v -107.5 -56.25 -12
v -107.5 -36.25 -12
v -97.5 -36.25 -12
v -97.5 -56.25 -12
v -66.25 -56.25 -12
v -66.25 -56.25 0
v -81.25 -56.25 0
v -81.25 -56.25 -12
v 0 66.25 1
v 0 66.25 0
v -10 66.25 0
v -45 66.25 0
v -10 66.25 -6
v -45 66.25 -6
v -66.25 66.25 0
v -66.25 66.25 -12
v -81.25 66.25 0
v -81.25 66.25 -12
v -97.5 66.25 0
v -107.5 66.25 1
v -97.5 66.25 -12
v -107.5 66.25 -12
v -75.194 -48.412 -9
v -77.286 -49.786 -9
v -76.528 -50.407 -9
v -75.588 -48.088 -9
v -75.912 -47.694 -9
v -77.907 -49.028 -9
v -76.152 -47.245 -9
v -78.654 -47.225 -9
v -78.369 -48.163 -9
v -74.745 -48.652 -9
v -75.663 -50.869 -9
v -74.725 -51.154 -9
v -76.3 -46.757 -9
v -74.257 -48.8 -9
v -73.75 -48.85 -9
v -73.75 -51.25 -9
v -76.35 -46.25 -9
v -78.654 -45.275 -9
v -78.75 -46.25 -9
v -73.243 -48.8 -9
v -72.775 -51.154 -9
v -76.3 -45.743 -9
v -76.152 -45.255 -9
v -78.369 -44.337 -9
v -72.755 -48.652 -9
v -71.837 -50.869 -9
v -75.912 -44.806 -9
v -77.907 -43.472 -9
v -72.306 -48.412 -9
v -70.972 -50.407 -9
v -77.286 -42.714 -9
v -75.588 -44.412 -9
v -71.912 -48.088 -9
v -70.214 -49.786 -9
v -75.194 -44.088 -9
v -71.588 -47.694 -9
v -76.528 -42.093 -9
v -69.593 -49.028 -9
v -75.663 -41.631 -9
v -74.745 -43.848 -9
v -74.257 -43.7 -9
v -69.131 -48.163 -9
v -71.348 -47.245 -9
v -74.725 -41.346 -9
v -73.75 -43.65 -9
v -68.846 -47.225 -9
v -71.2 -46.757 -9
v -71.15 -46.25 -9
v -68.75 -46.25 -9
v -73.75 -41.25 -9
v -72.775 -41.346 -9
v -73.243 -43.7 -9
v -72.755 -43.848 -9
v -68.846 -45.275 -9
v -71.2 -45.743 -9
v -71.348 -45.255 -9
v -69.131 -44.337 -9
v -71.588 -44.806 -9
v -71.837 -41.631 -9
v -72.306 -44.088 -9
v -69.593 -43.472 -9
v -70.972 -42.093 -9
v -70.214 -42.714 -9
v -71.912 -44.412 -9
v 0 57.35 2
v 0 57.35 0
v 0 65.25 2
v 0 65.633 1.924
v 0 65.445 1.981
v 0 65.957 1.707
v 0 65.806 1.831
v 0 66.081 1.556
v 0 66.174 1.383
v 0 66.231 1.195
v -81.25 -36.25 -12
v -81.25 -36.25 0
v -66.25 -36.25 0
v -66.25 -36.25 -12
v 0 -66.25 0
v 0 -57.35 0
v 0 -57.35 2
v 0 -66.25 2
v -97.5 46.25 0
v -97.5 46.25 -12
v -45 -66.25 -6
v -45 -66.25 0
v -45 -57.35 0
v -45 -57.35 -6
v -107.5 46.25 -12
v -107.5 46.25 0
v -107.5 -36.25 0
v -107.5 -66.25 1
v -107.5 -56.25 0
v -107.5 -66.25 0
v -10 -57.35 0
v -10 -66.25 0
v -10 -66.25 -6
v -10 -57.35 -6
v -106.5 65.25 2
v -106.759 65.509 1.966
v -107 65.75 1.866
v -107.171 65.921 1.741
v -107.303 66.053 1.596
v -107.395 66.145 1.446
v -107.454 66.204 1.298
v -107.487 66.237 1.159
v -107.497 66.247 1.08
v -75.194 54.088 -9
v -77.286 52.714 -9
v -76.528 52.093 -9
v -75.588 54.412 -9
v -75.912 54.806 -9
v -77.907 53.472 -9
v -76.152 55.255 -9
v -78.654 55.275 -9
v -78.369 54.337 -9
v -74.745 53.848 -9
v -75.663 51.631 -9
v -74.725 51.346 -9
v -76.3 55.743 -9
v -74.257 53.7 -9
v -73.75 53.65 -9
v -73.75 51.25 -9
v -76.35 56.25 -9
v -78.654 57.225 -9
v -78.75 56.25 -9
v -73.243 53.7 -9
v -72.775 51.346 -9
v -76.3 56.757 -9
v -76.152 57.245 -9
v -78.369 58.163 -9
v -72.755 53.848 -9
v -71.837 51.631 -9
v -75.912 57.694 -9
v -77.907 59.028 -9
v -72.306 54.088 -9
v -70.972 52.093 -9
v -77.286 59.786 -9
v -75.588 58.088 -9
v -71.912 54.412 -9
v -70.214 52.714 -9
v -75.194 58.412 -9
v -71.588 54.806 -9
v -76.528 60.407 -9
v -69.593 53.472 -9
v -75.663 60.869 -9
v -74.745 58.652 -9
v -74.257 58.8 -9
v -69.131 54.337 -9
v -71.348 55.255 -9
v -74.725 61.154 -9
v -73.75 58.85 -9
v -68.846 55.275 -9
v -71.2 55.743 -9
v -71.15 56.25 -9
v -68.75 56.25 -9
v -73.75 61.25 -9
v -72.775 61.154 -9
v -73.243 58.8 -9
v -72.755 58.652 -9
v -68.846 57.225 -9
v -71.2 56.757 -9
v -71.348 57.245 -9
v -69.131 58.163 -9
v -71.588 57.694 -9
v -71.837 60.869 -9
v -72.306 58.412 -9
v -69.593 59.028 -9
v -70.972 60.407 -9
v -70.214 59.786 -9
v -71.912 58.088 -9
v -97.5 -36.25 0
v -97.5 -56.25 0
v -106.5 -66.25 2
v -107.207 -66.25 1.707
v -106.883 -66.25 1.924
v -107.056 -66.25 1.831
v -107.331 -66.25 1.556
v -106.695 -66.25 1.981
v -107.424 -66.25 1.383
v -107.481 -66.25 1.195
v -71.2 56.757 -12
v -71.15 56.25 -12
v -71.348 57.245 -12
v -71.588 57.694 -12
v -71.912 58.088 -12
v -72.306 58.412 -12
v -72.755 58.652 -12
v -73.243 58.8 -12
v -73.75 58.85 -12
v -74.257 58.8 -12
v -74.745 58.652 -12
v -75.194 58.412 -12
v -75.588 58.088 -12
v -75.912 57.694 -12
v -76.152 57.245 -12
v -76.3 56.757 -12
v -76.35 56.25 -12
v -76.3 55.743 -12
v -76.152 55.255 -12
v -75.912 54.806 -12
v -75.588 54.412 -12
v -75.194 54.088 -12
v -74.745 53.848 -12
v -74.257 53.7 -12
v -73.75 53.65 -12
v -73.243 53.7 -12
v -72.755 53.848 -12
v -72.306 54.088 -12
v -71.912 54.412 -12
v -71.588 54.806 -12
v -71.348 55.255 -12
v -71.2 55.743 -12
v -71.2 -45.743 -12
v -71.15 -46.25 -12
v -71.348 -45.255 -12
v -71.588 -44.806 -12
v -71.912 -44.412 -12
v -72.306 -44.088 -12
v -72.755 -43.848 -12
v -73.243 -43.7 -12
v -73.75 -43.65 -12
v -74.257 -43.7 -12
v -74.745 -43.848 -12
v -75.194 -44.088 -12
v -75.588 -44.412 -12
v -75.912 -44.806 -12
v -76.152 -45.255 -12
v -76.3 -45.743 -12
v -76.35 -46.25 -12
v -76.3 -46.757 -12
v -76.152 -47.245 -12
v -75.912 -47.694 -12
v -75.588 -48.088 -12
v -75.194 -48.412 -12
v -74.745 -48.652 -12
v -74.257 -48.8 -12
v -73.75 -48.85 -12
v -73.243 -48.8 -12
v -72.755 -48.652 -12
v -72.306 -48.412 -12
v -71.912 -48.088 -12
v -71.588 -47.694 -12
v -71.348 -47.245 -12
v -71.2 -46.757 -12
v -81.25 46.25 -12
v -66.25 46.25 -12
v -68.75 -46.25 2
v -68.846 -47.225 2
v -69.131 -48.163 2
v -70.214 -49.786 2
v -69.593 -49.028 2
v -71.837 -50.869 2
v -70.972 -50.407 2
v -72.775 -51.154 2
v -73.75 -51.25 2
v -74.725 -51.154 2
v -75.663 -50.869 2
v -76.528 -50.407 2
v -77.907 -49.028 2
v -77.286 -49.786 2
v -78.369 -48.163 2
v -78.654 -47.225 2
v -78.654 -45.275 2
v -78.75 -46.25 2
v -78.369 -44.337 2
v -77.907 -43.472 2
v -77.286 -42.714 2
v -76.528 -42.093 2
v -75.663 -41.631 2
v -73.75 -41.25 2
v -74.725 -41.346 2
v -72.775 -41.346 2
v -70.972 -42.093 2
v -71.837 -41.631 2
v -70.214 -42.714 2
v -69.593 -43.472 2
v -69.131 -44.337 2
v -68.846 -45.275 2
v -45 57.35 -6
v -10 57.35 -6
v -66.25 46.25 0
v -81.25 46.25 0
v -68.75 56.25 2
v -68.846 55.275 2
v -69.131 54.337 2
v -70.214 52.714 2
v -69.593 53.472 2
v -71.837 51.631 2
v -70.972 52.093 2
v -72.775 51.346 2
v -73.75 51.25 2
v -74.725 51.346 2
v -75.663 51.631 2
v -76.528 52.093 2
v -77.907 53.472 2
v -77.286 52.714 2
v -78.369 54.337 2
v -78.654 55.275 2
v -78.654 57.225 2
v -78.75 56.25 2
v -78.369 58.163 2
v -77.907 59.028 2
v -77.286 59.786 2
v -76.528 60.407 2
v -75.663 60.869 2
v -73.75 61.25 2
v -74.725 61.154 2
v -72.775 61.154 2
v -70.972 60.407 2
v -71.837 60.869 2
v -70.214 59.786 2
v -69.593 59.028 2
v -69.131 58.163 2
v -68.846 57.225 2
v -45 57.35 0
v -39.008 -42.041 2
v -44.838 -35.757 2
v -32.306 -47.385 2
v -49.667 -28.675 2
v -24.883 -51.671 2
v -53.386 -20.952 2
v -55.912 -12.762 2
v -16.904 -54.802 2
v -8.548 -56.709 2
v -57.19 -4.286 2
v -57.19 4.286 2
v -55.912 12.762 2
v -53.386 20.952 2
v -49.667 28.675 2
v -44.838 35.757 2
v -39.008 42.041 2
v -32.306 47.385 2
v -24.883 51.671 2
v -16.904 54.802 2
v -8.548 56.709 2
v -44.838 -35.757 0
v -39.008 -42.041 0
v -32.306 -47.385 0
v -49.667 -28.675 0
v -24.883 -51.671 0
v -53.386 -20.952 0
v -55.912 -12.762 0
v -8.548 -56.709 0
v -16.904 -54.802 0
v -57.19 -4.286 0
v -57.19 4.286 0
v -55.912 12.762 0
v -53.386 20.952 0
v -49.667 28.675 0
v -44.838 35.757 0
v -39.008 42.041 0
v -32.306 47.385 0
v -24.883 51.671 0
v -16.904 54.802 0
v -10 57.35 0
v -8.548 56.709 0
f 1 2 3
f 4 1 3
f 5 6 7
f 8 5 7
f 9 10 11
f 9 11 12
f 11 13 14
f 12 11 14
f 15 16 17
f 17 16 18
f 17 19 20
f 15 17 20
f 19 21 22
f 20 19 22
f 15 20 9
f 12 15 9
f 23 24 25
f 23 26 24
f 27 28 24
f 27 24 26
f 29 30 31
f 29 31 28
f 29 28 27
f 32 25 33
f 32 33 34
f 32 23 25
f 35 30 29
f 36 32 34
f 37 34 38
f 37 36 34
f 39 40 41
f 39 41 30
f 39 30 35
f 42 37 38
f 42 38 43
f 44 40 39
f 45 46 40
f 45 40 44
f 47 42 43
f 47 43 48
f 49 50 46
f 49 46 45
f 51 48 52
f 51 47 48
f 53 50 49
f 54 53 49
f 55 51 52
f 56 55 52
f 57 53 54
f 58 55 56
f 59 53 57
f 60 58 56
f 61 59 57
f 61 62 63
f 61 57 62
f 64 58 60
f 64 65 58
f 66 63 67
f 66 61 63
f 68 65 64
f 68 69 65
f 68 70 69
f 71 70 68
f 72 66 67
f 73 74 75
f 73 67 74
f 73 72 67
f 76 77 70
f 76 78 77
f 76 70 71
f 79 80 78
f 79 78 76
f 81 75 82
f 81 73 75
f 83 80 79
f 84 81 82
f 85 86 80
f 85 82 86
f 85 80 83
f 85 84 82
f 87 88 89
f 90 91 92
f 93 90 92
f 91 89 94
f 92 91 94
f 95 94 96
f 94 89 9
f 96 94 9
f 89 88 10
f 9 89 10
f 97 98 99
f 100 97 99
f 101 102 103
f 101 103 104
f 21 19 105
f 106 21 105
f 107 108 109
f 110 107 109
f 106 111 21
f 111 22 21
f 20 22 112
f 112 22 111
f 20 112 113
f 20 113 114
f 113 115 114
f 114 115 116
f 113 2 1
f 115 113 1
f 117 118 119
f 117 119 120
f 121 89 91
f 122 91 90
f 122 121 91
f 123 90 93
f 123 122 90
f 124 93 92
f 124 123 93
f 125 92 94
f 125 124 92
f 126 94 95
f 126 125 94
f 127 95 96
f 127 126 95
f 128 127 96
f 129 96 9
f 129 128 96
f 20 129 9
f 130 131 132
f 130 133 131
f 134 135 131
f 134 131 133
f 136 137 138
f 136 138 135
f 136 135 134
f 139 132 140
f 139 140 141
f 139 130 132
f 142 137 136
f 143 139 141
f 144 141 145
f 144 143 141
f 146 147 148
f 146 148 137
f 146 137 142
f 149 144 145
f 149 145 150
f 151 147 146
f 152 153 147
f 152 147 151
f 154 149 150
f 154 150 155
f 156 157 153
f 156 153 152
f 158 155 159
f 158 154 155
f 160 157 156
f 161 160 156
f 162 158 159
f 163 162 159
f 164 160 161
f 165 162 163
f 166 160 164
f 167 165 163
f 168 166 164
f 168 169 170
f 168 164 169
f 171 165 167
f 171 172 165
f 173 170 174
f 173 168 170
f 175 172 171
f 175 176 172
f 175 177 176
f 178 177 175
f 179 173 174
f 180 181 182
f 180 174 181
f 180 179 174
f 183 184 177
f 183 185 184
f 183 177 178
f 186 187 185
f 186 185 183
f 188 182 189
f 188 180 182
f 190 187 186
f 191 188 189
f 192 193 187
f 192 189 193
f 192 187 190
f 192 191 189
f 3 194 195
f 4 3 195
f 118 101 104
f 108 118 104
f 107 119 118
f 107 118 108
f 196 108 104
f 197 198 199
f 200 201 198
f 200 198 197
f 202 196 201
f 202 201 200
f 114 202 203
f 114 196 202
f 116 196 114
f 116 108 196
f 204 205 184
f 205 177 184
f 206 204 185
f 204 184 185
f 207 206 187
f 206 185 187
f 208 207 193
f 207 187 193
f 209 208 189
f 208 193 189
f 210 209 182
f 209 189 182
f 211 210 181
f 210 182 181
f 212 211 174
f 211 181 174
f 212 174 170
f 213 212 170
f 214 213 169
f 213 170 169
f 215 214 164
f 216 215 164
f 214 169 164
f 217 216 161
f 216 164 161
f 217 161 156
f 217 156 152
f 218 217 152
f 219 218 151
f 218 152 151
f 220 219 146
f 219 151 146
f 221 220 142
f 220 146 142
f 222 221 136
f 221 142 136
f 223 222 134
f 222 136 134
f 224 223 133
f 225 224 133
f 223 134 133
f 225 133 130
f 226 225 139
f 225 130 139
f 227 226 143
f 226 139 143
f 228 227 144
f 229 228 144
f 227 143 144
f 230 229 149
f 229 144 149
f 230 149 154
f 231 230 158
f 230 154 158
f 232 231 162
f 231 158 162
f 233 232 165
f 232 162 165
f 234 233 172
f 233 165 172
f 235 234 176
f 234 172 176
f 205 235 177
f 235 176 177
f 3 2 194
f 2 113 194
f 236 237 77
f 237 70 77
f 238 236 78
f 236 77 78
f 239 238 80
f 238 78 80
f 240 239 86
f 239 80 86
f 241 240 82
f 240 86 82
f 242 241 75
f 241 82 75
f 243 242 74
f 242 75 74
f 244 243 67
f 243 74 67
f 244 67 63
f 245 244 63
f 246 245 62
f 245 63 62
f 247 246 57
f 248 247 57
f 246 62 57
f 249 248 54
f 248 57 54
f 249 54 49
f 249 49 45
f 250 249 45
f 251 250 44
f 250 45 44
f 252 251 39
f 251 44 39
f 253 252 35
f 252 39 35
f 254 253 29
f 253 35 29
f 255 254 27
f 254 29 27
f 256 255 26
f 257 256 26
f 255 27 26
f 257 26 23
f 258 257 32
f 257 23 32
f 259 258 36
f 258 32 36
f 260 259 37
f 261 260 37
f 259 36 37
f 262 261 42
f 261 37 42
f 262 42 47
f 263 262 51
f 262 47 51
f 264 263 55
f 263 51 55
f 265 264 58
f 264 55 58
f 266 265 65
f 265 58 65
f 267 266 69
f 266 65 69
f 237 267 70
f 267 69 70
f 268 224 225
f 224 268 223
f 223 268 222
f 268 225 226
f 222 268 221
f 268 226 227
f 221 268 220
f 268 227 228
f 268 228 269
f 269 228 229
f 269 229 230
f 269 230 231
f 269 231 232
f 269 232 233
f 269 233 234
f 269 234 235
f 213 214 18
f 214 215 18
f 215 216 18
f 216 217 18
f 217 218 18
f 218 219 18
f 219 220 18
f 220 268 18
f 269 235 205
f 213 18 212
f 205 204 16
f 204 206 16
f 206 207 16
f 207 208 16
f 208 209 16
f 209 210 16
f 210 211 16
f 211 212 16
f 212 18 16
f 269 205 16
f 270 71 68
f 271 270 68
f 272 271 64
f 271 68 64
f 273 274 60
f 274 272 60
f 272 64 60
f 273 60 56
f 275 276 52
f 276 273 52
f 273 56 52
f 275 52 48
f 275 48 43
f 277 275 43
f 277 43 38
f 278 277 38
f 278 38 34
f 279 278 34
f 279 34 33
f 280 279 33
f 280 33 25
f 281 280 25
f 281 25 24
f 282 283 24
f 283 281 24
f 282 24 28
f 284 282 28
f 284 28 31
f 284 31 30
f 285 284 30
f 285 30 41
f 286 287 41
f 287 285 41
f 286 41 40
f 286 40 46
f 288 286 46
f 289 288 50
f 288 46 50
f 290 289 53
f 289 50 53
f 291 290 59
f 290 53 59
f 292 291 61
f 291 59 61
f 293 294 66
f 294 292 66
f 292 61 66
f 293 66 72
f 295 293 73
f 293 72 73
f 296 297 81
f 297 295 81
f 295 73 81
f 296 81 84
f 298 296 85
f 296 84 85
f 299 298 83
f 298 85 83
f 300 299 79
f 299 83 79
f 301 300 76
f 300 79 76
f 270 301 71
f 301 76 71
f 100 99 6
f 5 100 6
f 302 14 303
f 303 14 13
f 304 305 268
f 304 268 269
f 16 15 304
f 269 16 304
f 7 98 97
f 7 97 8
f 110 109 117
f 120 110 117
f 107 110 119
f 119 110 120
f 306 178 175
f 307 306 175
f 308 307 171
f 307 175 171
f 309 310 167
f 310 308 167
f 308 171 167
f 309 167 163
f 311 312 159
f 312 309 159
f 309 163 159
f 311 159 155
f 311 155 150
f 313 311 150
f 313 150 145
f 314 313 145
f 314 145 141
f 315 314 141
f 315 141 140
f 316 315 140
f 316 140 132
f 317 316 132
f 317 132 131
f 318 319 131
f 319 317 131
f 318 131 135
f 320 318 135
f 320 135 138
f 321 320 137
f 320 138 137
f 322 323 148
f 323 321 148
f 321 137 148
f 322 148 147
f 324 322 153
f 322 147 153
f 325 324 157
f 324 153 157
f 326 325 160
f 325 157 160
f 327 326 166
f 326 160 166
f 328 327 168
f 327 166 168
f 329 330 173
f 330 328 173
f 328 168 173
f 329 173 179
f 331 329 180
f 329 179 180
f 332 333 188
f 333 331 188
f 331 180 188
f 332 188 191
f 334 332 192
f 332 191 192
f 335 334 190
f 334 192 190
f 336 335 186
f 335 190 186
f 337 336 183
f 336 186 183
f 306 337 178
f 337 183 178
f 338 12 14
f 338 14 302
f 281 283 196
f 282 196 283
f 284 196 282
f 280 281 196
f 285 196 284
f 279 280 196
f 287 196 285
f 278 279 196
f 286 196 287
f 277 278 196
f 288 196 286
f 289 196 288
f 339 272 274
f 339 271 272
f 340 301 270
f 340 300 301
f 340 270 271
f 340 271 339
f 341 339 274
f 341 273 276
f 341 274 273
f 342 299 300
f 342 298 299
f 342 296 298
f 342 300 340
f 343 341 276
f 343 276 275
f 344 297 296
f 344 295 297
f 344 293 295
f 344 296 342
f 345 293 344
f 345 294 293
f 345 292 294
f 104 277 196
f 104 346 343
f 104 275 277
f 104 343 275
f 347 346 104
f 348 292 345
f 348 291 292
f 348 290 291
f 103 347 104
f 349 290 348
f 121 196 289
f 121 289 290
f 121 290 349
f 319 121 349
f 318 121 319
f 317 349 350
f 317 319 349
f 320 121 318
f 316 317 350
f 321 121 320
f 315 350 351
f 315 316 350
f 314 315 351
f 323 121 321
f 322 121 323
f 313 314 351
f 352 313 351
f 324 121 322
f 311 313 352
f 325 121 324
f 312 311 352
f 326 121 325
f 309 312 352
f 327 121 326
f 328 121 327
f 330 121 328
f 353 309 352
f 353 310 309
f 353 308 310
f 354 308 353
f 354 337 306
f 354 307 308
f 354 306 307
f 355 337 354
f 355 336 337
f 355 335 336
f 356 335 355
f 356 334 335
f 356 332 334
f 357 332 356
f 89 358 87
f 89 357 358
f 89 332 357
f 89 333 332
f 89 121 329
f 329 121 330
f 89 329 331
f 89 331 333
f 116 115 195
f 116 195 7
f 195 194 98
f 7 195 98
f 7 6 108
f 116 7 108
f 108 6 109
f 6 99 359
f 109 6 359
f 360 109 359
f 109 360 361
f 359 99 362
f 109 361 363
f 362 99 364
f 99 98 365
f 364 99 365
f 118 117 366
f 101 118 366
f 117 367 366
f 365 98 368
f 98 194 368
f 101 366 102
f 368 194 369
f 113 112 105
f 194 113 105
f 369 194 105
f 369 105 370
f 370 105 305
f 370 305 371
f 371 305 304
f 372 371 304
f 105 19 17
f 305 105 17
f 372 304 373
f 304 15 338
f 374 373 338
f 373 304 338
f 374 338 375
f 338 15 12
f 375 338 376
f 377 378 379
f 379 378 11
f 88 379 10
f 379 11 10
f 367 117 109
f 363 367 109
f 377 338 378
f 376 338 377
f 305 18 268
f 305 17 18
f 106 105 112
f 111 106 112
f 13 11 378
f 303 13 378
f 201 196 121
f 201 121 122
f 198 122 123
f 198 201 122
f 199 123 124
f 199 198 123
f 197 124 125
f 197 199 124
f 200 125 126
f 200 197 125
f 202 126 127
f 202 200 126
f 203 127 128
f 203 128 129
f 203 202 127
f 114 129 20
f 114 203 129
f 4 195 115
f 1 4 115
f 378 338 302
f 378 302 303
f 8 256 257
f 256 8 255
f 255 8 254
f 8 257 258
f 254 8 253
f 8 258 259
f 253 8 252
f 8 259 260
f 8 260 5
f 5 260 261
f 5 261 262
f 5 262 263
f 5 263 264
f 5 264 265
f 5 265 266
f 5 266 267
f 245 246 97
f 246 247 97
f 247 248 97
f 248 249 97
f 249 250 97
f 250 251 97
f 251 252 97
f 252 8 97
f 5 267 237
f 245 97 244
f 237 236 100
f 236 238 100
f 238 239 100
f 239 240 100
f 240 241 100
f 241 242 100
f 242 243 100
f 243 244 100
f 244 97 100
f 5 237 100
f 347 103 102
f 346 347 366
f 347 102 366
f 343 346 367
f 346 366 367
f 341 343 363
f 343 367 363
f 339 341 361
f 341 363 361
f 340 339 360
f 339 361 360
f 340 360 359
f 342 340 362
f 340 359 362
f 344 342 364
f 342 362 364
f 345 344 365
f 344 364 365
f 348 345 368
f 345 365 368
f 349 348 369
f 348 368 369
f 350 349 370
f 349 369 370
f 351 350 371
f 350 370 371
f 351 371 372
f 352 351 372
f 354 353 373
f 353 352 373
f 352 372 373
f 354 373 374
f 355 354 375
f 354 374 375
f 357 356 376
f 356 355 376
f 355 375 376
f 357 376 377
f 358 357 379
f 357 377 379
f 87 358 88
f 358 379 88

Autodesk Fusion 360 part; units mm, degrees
sketch "스케치1" plane through (0, 0, 0) normal (0, 0, 1) x (1, 0, 0)
  line L0 (0, 0) -> (-66.25, 0)
  line L1 (-66.25, 0) -> (-107.5, 0)
  circle A0 centre (0, 0) radius 57.35
  line L2 (0, 57.35) -> (0, -57.35)
  line L3 (0, 0) -> (0, 66.25)
  line L4 (0, 66.25) -> (-107.5, 66.25)
  line L5 (-107.5, 66.25) -> (-107.5, 46.25)
  line L6 (-107.5, 46.25) -> (-107.5, -36.25)
  line L7 (-107.5, -36.25) -> (-107.5, -56.25)
  line L8 (0, 0) -> (0, -66.25)
  line L9 (0, -66.25) -> (-107.5, -66.25)
  line L10 (-107.5, -56.25) -> (-107.5, -66.25)
  line L11 (-66.25, 66.25) -> (-66.25, -66.25)
  line L12 (-66.25, 66.25) -> (-81.25, 66.25)
  line L13 (-81.25, 66.25) -> (-81.25, 46.25)
  line L14 (-81.25, 46.25) -> (-66.25, 46.25)
  line L15 (-66.25, 46.25) -> (-66.25, 66.25)
  line L16 (-107.5, 66.25) -> (-97.5, 66.25)
  line L17 (-97.5, 66.25) -> (-97.5, 46.25)
  line L18 (-97.5, 46.25) -> (-107.5, 46.25)
  line L19 (-107.5, 46.25) -> (-107.5, 66.25)
  line L20 (-107.5, -36.25) -> (-66.25, -36.25)
  line L21 (-66.25, -36.25) -> (-66.25, -56.25)
  line L22 (-66.25, -56.25) -> (-107.5, -56.25)
  line L23 (-107.5, -56.25) -> (-107.5, -36.25)
  line L24 (-66.25, -36.25) -> (-81.25, -36.25)
  line L25 (-81.25, -36.25) -> (-81.25, -56.25)
  line L26 (-81.25, -56.25) -> (-66.25, -56.25)
  line L27 (-66.25, -56.25) -> (-66.25, -36.25)
  line L28 (-107.5, -36.25) -> (-97.5, -36.25)
  line L29 (-97.5, -36.25) -> (-97.5, -56.25)
  line L30 (-97.5, -56.25) -> (-107.5, -56.25)
  line L31 (-107.5, -56.25) -> (-107.5, -36.25)
  circle A1 centre (-73.75, 56.25) radius 2.6
  circle A2 centre (-73.75, -46.25) radius 2.6
  circle A3 centre (-73.75, 56.25) radius 5
  circle A4 centre (-73.75, -46.25) radius 5
  line L32 (-66.25, 66.25) -> (-56.25, 66.25)
  line L33 (-56.25, 66.25) -> (-56.25, 56.25)
  line L34 (-56.25, 56.25) -> (-66.25, 56.25)
  line L35 (-66.25, 56.25) -> (-66.25, 66.25)
  circle A5 centre (-56.25, 56.25) radius 5
  line L36 (-66.25, -66.25) -> (-56.25, -66.25)
  line L37 (-56.25, -66.25) -> (-56.25, -46.25)
  line L38 (-56.25, -46.25) -> (-66.25, -46.25)
  line L39 (-66.25, -46.25) -> (-66.25, -66.25)
  circle A6 centre (-56.25, -46.25) radius 5
  line L40 (0, -66.25) -> (-45, -66.25)
  line L41 (-45, -66.25) -> (-45, -57.35)
  line L42 (-45, -57.35) -> (0, -57.35)
  line L43 (0, -57.35) -> (0, -66.25)
  line L44 (0, -66.25) -> (-10, -66.25)
  line L45 (-10, -66.25) -> (-10, -57.35)
  line L46 (-10, -57.35) -> (0, -57.35)
  line L47 (0, -57.35) -> (0, -66.25)
  line L48 (0, 66.25) -> (-45, 66.25)
  line L49 (-45, 66.25) -> (-45, 57.35)
  line L50 (-45, 57.35) -> (0, 57.35)
  line L51 (0, 57.35) -> (0, 66.25)
  line L52 (0, 66.25) -> (-10, 66.25)
  line L53 (-10, 66.25) -> (-10, 57.35)
  line L54 (-10, 57.35) -> (0, 57.35)
  line L55 (0, 57.35) -> (0, 66.25)
  dimension "d1" = 66.25
  dimension "d2" = 41.25
  dimension "d3" = 114.7
  dimension "d4" = 66.25
  dimension "d5" = 20
  dimension "d6" = 82.5
  dimension "d7" = 20
  dimension "d8" = 66.25
  dimension "d9" = 15
  dimension "d10" = 20
  dimension "d11" = 10
  dimension "d12" = 20
  dimension "d13" = 20
  dimension "d14" = 15
  dimension "d15" = 20
  dimension "d16" = 10
  dimension "d17" = 5.2
  dimension "d18" = 5.2
  dimension "d19" = 10
  dimension "d20" = 10
  dimension "d21" = 10
  dimension "d22" = 10
  dimension "d23" = 10
  dimension "d24" = 10
  dimension "d25" = 20
  dimension "d26" = 10
  dimension "d31" = 45
  dimension "d32" = 10
  dimension "d35" = 45
  dimension "d36" = 10
extrude "돌출1" add sketch "스케치1" along normal blind 2 contours L0 A0 L9 L11 L21 L27 L37 L38 A6 L41 L42 L46 | L0 A0 L4 L11 L15 L33 L34 A5 L49 L50 L54 | L3 L4 L48 L50 L51 L52 L53 L54 L55 | L8 L9 L40 L42 L43 L44 L45 L46 L47 | L1 L6 L11 L20 L24 L28 | L1 L4 L6 L11 L13 L14 L17 L18 | L4 L48 L49 L50 L53 | L9 L40 L41 L42 L45 | L4 L11 L12 L13 L14 L15 L35 | L11 L20 L21 L22 L24 L25 L26 L27 L39 | L4 L5 L16 L17 L18 L19 | L7 L20 L22 L23 L28 L29 L30 L31 | L4 L11 L15 L32 L33 L34 L35 A5 | L9 L11 L21 L27 L36 L37 L38 L39 A6 | L20 L22 L25 L29 | L9 L10 L11 L22 L26 L30 L39 | L33 L34 A5 | L33 L34 A5 | L37 L38 A6 | L37 L38 A6
extrude "돌출2" add sketch "스케치1" against normal blind 12 contours L4 L11 L12 L13 L14 L15 L35 | L11 L20 L21 L22 L24 L25 L26 L27 L39 | L4 L5 L16 L17 L18 L19 | L7 L20 L22 L23 L28 L29 L30 L31 | A3 | A4
extrude "돌출3" add sketch "스케치1" against normal blind 6 contours L4 L48 L49 L50 L53 | L9 L40 L41 L42 L45
extrude "돌출4" cut 2 faces at (-69.5686, 56.0016, 0) (-69.5686, -46.4984, 0) along direction (0, 0, -1) blind 9
fillet "필렛2" radius 1 2 edges at (-53.75, 66.25, 2) (-107.5, 0, 2)
